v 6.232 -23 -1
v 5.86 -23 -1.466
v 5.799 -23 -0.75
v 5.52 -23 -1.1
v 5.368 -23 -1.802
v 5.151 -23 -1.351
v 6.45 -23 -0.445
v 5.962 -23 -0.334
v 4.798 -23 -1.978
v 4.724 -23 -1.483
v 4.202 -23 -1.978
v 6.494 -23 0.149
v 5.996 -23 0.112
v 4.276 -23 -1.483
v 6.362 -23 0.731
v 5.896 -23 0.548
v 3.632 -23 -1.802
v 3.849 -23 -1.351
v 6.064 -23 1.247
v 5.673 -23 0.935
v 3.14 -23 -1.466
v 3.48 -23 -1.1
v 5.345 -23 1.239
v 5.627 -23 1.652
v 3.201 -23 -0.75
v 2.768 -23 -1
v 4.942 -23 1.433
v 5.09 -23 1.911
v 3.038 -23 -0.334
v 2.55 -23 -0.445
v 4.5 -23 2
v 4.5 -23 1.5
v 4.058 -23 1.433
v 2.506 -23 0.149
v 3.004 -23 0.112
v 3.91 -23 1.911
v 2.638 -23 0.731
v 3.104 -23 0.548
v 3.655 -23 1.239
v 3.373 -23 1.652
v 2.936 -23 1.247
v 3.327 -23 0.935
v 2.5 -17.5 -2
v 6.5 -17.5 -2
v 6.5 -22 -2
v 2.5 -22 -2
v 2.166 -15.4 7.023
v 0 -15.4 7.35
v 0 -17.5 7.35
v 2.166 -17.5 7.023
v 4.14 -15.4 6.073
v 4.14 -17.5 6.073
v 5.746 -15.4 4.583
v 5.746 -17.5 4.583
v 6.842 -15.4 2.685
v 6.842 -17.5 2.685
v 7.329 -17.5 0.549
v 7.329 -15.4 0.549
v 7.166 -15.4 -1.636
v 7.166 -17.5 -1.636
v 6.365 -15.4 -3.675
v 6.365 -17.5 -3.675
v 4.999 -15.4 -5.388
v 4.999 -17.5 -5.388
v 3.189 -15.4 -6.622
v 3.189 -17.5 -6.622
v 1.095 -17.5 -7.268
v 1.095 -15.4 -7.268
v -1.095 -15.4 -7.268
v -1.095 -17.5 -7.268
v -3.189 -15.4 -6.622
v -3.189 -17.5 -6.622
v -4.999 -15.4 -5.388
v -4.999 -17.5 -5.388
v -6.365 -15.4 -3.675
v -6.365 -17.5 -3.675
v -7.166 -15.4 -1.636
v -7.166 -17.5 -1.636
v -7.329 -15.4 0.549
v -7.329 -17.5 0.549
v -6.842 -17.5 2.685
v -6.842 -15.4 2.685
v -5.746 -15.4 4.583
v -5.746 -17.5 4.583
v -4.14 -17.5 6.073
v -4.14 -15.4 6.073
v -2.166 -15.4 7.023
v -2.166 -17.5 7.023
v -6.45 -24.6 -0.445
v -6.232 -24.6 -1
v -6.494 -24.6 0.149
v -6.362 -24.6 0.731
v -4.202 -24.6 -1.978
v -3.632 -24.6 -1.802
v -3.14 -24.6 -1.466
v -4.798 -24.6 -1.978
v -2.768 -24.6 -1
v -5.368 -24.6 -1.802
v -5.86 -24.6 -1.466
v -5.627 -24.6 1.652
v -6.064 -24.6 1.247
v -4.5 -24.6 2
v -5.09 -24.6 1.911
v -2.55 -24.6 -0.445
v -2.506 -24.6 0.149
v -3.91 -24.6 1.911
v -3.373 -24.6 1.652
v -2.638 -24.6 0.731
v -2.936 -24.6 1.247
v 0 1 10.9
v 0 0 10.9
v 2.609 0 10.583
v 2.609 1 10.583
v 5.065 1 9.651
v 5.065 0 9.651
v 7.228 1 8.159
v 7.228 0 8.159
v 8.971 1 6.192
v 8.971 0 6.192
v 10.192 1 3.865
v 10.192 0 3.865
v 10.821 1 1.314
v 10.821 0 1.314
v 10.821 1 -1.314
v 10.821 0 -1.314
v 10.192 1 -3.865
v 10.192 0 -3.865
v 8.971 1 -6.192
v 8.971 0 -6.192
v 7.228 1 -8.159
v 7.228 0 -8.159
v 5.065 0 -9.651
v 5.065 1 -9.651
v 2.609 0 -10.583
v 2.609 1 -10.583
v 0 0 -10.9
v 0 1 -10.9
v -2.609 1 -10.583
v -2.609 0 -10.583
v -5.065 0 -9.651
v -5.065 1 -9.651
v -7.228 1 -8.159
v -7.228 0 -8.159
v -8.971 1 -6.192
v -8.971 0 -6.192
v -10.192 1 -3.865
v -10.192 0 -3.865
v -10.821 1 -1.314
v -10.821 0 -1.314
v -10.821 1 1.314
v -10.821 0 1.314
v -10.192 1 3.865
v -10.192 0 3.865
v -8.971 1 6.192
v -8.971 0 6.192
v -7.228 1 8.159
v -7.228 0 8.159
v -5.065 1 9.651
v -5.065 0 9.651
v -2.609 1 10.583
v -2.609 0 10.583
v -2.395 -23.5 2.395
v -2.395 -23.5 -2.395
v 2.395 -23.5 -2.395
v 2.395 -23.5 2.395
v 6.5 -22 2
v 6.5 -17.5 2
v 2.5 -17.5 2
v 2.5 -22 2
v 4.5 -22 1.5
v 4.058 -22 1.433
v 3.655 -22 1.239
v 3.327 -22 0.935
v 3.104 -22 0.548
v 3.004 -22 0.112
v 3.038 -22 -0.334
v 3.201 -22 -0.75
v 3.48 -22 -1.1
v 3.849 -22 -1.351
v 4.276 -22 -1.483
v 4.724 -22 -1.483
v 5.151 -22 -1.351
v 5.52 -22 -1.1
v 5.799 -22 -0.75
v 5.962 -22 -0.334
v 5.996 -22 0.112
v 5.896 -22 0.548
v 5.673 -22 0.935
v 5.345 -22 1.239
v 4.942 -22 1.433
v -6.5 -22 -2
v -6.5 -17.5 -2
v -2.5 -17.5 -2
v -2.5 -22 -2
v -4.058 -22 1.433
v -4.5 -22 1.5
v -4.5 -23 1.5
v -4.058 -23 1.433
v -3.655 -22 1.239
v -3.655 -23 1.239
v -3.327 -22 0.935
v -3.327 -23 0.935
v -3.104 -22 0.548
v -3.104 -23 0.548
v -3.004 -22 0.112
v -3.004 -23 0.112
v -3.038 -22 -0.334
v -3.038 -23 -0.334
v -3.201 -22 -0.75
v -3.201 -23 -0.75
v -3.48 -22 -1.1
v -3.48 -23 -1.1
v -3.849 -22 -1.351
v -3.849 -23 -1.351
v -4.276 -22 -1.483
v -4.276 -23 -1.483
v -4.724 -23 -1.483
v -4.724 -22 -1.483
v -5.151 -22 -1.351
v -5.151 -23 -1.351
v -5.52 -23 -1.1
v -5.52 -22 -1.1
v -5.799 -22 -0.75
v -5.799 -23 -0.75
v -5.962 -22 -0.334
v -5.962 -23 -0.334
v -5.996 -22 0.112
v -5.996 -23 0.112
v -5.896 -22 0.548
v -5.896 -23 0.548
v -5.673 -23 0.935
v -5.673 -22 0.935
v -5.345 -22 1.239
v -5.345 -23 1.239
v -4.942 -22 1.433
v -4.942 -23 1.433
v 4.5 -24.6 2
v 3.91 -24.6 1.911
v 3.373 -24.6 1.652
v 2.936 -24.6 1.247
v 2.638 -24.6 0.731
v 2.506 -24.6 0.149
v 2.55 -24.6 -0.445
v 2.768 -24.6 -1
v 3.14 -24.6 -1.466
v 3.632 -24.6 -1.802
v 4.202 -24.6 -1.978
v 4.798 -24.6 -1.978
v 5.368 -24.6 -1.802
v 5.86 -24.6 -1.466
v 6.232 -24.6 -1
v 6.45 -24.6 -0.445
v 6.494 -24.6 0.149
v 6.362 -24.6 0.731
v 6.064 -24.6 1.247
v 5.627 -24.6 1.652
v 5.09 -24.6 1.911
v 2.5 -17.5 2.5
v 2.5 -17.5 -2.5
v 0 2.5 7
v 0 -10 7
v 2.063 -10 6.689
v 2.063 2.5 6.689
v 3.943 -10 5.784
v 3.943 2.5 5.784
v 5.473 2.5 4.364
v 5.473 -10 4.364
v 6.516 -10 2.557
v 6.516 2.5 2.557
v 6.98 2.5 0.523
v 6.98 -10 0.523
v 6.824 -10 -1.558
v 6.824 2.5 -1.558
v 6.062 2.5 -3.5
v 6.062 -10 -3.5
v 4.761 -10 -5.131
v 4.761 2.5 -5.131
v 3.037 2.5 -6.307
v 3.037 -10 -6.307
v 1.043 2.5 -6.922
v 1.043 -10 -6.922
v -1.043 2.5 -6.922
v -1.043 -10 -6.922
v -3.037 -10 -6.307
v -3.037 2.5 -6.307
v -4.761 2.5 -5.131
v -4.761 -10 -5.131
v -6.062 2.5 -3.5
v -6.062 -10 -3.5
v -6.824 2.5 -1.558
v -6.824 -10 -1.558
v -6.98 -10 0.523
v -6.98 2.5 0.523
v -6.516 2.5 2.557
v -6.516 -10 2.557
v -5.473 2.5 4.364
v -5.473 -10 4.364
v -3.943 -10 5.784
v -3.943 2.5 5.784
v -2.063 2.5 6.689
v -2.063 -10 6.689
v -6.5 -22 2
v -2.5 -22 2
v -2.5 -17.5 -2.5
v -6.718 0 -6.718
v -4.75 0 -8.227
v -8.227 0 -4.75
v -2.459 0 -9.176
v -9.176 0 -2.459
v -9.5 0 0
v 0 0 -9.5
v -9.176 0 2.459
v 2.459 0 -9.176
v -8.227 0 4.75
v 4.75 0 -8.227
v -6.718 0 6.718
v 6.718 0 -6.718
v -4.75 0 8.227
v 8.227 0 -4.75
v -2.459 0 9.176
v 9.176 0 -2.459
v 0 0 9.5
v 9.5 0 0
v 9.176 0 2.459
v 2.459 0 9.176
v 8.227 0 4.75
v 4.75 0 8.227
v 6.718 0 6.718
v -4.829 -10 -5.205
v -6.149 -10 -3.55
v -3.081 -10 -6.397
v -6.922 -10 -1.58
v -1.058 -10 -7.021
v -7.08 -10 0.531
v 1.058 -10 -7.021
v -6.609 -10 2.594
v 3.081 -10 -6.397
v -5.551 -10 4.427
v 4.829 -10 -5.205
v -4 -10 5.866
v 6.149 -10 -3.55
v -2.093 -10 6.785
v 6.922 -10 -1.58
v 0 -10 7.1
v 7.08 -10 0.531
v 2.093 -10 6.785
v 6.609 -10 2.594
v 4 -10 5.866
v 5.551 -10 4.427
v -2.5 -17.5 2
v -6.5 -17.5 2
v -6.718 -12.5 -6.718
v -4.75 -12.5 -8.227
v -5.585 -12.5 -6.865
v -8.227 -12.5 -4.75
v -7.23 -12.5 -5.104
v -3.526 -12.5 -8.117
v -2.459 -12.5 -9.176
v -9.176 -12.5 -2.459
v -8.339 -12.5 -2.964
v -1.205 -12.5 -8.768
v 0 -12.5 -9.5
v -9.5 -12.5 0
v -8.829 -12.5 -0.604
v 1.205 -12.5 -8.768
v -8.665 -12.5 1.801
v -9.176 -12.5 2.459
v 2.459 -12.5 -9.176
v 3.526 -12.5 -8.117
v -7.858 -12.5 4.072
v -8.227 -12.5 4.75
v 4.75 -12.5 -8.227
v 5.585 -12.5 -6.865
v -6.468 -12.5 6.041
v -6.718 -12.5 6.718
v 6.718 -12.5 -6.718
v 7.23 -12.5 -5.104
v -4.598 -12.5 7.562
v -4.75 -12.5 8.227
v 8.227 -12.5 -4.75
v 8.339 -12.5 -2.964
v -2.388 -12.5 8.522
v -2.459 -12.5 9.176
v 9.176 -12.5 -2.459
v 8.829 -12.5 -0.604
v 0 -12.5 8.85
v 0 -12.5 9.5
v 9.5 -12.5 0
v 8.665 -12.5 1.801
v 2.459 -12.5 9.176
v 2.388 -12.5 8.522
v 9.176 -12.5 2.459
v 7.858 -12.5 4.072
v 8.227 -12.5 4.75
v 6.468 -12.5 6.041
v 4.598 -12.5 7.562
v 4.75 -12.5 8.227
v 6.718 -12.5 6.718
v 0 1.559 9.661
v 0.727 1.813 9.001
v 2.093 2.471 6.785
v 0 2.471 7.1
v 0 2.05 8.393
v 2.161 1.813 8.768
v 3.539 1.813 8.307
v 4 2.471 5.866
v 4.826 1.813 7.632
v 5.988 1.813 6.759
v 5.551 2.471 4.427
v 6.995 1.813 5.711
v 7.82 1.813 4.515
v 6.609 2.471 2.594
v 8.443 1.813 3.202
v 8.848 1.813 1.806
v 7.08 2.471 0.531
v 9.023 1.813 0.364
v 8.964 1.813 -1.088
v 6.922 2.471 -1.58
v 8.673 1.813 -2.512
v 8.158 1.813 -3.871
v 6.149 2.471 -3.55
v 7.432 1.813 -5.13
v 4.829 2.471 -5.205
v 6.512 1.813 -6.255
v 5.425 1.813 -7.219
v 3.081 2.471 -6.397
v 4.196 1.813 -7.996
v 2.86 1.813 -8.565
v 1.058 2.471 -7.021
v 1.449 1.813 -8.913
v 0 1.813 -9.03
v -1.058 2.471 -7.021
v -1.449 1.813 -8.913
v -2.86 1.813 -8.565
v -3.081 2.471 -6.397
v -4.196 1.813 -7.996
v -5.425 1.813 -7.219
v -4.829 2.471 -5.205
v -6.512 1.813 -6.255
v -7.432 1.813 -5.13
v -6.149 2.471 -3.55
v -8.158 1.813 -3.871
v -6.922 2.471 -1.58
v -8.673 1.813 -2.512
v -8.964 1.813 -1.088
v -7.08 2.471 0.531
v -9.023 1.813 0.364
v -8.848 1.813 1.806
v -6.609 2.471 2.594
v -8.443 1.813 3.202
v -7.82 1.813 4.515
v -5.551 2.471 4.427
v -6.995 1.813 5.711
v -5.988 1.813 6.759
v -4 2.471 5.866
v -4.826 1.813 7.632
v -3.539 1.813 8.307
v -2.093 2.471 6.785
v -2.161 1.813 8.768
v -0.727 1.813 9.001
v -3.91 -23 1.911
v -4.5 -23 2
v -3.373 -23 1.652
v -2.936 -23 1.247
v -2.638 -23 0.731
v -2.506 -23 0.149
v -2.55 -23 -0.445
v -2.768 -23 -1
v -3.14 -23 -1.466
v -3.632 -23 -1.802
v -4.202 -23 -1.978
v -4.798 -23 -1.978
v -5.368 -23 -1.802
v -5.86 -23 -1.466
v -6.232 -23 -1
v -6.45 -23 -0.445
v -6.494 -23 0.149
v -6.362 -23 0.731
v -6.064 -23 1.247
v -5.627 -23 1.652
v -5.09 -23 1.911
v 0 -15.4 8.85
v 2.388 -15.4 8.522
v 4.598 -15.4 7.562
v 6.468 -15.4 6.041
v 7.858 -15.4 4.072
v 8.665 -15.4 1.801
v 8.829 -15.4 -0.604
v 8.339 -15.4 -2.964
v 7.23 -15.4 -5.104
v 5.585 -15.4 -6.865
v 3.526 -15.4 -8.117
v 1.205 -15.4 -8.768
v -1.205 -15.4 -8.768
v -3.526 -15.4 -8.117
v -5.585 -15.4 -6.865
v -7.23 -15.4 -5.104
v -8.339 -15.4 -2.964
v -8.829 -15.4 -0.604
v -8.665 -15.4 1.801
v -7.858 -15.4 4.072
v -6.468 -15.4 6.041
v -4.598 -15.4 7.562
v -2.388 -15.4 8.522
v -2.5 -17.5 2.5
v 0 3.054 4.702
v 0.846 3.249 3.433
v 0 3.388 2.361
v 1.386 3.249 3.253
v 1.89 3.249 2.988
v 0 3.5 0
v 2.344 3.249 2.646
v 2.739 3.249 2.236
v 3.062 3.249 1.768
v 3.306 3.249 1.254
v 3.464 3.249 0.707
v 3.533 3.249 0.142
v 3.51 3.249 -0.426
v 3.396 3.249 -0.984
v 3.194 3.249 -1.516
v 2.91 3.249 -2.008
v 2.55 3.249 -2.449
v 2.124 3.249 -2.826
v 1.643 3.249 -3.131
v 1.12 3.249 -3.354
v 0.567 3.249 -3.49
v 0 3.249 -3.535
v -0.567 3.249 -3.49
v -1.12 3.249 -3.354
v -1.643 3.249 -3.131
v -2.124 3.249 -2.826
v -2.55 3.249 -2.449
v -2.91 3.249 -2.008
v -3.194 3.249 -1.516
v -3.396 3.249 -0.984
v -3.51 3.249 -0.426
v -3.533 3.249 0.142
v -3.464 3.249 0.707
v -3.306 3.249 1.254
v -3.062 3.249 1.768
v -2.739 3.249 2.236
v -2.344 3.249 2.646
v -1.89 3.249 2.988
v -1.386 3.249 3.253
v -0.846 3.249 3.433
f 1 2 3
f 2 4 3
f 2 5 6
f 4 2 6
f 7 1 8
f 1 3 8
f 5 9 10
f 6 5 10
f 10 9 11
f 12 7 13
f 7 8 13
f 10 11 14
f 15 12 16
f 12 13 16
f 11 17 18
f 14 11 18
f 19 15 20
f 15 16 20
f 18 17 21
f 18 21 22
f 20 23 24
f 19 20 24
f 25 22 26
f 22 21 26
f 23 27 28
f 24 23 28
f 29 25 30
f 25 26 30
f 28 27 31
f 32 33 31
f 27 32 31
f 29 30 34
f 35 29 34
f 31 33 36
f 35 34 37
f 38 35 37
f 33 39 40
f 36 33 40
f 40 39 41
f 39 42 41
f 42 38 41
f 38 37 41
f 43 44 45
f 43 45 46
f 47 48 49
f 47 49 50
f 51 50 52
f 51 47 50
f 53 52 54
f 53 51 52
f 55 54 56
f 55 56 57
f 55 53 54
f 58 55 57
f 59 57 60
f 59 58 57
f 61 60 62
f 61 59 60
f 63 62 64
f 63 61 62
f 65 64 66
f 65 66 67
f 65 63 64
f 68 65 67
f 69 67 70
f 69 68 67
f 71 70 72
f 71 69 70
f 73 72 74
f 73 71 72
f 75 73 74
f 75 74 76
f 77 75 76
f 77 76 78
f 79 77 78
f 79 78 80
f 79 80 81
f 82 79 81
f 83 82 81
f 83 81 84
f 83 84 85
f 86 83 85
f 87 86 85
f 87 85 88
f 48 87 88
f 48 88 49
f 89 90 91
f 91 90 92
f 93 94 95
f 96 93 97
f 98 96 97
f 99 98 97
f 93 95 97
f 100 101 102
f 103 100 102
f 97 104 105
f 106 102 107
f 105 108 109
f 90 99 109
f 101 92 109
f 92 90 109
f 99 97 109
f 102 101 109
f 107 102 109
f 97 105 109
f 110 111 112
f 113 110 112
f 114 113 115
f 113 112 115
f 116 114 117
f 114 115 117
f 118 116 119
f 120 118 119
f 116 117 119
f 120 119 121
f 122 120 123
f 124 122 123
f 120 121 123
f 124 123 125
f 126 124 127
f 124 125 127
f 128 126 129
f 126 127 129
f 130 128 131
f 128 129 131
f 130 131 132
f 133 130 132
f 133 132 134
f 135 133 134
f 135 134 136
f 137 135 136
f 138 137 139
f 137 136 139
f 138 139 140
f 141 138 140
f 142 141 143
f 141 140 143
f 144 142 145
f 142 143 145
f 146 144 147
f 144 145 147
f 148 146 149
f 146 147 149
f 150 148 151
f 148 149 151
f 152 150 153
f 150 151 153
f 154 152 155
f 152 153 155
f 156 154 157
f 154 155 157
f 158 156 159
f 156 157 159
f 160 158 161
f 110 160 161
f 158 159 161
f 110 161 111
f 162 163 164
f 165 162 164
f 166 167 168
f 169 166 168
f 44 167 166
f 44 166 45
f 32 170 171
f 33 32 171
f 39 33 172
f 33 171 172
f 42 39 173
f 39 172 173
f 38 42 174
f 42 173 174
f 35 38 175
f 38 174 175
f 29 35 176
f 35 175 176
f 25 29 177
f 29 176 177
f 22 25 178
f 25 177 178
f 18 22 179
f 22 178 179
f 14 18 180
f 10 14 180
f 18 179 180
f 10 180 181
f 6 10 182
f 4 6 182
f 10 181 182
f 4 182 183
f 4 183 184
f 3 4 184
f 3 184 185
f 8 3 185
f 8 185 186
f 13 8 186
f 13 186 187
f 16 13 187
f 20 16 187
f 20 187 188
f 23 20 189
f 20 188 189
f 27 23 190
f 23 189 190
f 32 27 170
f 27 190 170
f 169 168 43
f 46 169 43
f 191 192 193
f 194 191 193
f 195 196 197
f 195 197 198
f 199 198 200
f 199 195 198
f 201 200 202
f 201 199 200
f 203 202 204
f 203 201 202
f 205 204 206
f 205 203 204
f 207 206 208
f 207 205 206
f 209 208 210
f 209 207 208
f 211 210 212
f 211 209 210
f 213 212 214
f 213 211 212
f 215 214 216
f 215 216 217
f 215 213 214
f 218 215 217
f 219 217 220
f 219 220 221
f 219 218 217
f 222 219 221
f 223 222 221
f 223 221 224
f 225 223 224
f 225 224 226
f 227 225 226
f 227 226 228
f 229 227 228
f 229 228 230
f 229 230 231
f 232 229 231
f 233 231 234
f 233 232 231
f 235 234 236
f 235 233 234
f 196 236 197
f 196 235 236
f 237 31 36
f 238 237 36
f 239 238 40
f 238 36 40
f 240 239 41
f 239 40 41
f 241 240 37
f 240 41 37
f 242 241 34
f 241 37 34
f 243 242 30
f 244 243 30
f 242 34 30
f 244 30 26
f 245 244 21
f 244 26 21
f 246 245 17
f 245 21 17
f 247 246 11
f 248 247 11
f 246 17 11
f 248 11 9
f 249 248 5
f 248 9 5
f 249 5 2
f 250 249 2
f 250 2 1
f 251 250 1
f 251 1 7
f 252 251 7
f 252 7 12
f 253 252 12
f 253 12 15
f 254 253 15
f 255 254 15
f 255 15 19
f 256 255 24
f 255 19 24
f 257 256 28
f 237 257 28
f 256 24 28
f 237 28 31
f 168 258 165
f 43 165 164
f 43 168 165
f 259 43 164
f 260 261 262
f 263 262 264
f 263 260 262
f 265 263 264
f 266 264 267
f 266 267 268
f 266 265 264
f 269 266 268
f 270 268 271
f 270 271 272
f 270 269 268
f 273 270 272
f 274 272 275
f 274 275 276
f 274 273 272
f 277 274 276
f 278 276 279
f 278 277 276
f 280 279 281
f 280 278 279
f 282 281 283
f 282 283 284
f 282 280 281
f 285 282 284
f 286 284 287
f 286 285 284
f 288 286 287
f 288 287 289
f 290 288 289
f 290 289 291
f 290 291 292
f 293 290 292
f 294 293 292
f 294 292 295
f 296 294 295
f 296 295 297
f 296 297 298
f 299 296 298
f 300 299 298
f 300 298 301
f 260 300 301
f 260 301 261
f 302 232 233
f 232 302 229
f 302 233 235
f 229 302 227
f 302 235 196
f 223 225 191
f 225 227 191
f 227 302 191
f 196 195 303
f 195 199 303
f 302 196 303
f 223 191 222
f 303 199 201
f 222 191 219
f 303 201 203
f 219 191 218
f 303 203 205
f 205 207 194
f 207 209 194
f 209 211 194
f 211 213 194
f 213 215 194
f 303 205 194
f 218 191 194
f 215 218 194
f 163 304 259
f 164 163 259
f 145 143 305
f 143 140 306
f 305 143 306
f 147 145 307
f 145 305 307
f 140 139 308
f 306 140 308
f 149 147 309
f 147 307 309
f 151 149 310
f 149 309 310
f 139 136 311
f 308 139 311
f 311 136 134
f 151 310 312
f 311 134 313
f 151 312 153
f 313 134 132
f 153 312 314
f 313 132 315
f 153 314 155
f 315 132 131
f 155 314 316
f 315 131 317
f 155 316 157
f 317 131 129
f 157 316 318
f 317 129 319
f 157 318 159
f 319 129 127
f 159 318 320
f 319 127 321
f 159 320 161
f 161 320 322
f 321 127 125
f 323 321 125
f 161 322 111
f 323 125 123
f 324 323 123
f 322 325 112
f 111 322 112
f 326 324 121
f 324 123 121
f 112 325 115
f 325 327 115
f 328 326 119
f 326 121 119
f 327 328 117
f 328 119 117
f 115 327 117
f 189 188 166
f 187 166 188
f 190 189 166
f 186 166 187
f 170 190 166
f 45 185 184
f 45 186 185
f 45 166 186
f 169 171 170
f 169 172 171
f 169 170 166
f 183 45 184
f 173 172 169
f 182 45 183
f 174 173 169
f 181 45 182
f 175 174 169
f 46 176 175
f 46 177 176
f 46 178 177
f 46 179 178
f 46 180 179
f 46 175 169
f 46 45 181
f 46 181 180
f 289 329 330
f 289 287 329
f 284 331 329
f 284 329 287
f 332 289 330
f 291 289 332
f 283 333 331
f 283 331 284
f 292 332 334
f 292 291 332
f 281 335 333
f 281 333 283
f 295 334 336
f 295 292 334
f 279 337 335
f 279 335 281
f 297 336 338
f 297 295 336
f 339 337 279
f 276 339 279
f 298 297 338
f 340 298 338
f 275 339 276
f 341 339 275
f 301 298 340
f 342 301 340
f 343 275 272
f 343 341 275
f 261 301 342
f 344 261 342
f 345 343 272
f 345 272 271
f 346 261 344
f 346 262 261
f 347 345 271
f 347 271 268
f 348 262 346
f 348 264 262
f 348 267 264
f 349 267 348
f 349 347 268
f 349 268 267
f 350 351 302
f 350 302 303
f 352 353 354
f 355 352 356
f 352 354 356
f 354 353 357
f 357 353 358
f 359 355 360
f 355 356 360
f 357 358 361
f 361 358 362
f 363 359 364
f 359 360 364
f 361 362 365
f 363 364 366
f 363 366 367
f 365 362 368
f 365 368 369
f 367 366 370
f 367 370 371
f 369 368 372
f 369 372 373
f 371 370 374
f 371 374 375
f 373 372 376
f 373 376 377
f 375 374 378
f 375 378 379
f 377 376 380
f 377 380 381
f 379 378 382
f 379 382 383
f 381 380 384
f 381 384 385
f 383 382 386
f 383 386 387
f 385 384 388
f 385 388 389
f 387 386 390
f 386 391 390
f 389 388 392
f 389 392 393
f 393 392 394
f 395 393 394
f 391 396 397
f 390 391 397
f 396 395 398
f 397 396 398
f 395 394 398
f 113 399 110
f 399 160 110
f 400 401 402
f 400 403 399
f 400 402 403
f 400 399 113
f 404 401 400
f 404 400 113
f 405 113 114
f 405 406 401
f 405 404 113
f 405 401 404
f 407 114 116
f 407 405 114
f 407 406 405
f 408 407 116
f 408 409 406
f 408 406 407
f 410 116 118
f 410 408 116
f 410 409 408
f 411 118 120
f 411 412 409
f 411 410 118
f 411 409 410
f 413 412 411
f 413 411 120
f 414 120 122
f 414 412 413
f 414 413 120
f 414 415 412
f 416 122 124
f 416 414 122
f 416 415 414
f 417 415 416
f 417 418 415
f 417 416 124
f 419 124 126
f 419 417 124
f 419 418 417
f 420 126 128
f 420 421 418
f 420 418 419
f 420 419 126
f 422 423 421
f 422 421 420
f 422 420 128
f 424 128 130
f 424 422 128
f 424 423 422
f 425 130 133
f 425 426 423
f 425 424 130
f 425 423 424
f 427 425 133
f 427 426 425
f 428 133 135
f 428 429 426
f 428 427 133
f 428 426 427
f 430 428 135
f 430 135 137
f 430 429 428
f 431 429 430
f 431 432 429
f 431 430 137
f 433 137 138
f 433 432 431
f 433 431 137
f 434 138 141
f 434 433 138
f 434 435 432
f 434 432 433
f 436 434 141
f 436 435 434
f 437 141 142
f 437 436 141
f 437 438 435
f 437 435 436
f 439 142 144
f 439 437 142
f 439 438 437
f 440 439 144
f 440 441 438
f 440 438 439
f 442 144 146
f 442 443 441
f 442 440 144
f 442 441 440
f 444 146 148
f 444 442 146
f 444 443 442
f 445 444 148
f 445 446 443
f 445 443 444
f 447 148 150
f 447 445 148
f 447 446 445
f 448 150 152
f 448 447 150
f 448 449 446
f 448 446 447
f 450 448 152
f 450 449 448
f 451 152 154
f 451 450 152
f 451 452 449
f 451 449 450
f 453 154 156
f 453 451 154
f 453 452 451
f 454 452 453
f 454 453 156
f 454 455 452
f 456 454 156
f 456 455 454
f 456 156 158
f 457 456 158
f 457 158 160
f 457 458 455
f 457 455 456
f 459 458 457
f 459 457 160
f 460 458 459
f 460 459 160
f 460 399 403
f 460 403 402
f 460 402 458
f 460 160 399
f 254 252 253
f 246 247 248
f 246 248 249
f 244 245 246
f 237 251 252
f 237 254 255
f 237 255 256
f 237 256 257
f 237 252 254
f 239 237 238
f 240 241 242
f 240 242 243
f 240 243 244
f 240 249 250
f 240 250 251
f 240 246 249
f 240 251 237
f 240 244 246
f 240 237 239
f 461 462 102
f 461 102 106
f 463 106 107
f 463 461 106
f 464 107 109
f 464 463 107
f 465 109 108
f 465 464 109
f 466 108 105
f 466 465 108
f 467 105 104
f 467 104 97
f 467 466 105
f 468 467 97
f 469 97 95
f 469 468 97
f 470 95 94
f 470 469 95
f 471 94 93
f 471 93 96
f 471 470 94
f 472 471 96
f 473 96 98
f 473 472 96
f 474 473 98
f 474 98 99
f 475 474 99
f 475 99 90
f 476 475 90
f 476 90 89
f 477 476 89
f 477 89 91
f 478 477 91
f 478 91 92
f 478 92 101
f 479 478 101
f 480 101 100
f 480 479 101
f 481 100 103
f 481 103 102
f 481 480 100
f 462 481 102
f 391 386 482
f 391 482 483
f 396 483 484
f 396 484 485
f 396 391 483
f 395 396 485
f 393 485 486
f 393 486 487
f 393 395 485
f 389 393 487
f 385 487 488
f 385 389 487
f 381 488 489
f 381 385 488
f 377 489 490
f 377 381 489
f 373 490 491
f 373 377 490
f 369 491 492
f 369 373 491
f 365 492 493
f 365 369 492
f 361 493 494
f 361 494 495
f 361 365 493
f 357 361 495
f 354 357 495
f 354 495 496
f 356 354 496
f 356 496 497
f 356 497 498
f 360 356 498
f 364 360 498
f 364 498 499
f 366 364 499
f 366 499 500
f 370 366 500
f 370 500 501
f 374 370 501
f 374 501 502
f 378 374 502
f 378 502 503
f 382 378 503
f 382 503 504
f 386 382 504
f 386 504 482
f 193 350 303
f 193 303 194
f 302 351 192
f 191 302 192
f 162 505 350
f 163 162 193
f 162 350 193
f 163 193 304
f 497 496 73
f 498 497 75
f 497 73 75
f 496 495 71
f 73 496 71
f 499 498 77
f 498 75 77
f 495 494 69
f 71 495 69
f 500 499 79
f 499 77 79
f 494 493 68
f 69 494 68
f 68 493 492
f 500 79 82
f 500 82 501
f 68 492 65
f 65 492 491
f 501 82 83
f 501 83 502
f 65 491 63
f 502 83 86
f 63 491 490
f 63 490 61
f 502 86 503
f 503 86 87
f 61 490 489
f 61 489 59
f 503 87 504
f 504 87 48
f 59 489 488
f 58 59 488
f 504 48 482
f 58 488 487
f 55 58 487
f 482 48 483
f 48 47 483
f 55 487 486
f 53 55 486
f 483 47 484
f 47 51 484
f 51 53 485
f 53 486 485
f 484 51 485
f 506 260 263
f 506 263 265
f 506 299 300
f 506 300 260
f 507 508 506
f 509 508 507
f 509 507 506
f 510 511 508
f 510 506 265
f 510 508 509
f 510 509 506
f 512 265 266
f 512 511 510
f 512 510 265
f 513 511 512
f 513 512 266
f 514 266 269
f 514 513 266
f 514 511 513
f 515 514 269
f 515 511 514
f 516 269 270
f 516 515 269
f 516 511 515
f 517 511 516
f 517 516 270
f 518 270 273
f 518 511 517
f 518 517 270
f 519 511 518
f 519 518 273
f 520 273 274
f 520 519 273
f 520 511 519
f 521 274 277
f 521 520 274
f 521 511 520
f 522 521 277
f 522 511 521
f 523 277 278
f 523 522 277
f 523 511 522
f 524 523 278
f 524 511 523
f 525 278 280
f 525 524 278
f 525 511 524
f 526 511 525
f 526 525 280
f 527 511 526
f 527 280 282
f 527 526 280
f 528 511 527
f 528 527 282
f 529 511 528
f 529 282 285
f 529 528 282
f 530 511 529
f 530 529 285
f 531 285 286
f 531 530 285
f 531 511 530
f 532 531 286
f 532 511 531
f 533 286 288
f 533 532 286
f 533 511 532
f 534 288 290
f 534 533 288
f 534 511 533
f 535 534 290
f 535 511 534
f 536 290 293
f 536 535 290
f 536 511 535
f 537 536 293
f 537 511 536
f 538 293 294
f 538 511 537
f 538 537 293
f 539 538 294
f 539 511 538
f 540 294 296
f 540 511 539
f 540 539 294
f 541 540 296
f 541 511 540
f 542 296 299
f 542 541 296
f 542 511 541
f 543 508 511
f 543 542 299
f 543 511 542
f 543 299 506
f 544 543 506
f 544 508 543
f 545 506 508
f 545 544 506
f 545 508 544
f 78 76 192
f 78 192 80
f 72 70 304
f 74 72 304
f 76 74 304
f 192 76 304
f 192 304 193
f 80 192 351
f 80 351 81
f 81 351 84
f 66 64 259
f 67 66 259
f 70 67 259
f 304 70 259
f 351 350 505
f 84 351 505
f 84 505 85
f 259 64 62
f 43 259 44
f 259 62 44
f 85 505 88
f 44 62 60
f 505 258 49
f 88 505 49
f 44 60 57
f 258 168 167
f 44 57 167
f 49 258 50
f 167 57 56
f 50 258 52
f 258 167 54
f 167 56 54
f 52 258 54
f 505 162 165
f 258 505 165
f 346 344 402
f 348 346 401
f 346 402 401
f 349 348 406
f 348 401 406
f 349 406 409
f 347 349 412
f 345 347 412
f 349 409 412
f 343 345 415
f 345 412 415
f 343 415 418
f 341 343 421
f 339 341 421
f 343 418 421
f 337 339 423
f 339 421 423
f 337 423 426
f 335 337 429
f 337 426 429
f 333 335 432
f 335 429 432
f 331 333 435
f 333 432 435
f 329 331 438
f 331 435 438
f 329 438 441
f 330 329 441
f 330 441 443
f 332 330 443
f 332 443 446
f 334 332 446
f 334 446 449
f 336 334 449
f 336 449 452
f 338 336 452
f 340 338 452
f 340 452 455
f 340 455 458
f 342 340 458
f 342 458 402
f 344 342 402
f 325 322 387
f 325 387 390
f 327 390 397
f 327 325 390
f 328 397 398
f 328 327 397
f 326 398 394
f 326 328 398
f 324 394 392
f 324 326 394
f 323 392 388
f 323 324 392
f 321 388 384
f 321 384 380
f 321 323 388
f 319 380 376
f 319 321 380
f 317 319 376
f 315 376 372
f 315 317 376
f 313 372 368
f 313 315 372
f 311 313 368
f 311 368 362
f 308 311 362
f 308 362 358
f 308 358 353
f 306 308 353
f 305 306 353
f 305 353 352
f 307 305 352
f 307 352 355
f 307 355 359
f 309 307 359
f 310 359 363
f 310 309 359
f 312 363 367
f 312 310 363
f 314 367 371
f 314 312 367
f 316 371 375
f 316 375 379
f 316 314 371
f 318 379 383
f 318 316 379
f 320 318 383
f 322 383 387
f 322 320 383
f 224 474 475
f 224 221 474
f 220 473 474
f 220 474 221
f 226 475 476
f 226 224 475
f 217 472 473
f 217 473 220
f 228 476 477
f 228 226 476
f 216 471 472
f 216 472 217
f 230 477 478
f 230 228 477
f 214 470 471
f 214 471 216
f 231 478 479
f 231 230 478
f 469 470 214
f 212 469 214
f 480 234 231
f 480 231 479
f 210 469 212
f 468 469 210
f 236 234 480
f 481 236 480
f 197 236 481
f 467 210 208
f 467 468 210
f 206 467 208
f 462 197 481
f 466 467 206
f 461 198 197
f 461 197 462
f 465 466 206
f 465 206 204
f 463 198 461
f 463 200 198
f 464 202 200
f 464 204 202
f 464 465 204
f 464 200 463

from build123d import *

# Parameters (mm, degrees)
SKETCH_1_R          = 10.9
EXTRUDE_1_DEPTH     = 1
DOME_1_FACE_RADIUS  = 10.9
DOME_1_HEIGHT       = 2.5
SKETCH_2_R          = 9.5
EXTRUDE_2_DEPTH     = 12.5
SKETCH_3_R          = 8.85
EXTRUDE_3_DEPTH     = 15.4
SKETCH_4_R          = 7.35
EXTRUDE_4_DEPTH     = 17.5
EXTRUDE_START       = -17.5
SKETCH_6_W          = 5
SKETCH_6_H          = 5
EXTRUDE_5_DEPTH     = 6
EXTRUDE_5_DRAFT     = -1
SKETCH_7_W          = 4
SKETCH_7_H          = 4
EXTRUDE_6_DEPTH     = 4.5
EXTRUDE_START_2     = -22
SKETCH_8_R          = 1.5
EXTRUDE_7_DEPTH     = 1
EXTRUDE_START_3     = -23
SKETCH_9_R          = 2
EXTRUDE_11_DEPTH    = 1.6
CUT_EXTRUDE_START   = 5
SKETCH_5_R          = 7.1
SKETCH_5_R_2        = 7
CUT_EXTRUDE_1_DEPTH = 15


with BuildPart() as part:
    # Эскиз1 → Бобышка-Вытянуть1 (new body)
    with BuildSketch(Plane(origin=(0, 0, 0), x_dir=(1, 0, 0), z_dir=(0, 1, 0))):
        with Locations(Location((0, 0, 0), (0, 0, 270))):
            Circle(SKETCH_1_R)
    extrude(amount=EXTRUDE_1_DEPTH)

    # Купол1: a dome of height H over a round flat face of radius A is a cap of a sphere of radius (A * A + H * H) / (2 * H)
    dome_1_r = (DOME_1_FACE_RADIUS * DOME_1_FACE_RADIUS + DOME_1_HEIGHT * DOME_1_HEIGHT) / (2 * DOME_1_HEIGHT)
    dome_1_base = Plane((0, 1, 0), z_dir=(0, 1, 0))
    with Locations(dome_1_base.offset(DOME_1_HEIGHT - dome_1_r)):
        dome_1_ball = Sphere(dome_1_r, mode=Mode.PRIVATE)
    add(split(dome_1_ball, bisect_by=dome_1_base, keep=Keep.TOP, mode=Mode.PRIVATE))

    # Эскиз2 → Бобышка-Вытянуть2 (add)
    with BuildSketch(Plane(origin=(0, 0, 0), x_dir=(1, 0, 0), z_dir=(0, 1, 0))):
        with Locations(Location((0, 0, 0), (0, 0, 270))):
            Circle(SKETCH_2_R)
    extrude(amount=-EXTRUDE_2_DEPTH)

    # Эскиз3 → Бобышка-Вытянуть3 (add)
    with BuildSketch(Plane(origin=(0, 0, 0), x_dir=(1, 0, 0), z_dir=(0, 1, 0))):
        with Locations(Location((0, 0, 0), (0, 0, 270))):
            Circle(SKETCH_3_R)
    extrude(amount=-EXTRUDE_3_DEPTH)

    # Эскиз4 → Бобышка-Вытянуть4 (add)
    with BuildSketch(Plane(origin=(0, 0, 0), x_dir=(1, 0, 0), z_dir=(0, 1, 0))):
        with Locations(Location((0, 0, 0), (0, 0, 270))):
            Circle(SKETCH_4_R)
    extrude(amount=-EXTRUDE_4_DEPTH)


with BuildPart() as extrude_5_tool:
    # Эскиз6 → Бобышка-Вытянуть5 (with draft: the straight prism first)
    with BuildSketch(Plane(origin=(0, 0, 0), x_dir=(1, 0, 0), z_dir=(0, 1, 0)).offset(EXTRUDE_START)):
        Rectangle(SKETCH_6_W, SKETCH_6_H)
    extrude(amount=-EXTRUDE_5_DEPTH)
    # Бобышка-Вытянуть5: the draft: its side faces are tilted about the plane it starts from
    extrude_5_sides = [extrude_5_tool.faces().sort_by_distance(p)[0] for p in [
        (0, -20.5, 2.5),
        (2.5, -20.5, 0),
        (0, -20.5, -2.5),
        (-2.5, -20.5, 0),
    ]]
    draft(extrude_5_sides, Plane(origin=(0, 0, 0), x_dir=(1, 0, 0), z_dir=(0, 1, 0)).offset(EXTRUDE_START), EXTRUDE_5_DRAFT)


with BuildPart() as part_1:
    add(part.part)

    # Бобышка-Вытянуть5: add extrude_5_tool
    add(extrude_5_tool.part)

    # Эскиз7 → Бобышка-Вытянуть6 (add)
    with BuildSketch(Plane(origin=(0, 0, 0), x_dir=(1, 0, 0), z_dir=(0, 1, 0)).offset(EXTRUDE_START)):
        with Locations((-4.5, 0)):
            Rectangle(SKETCH_7_W, SKETCH_7_H)
    extrude_6 = extrude(amount=-EXTRUDE_6_DEPTH)

    # Зеркальное отражение1: Бобышка-Вытянуть6 across plane
    add(extrude_6.mirror(Plane(origin=(0, 0, 0), x_dir=(0, 0, 1), z_dir=(1, 0, 0))))

    # Эскиз8 → Бобышка-Вытянуть7 (add)
    with BuildSketch(Plane(origin=(0, 0, 0), x_dir=(1, 0, 0), z_dir=(0, 1, 0)).offset(EXTRUDE_START_2)):
        with Locations(Location((-4.5, 0, 0), (0, 0, 270))):
            Circle(SKETCH_8_R)
    extrude_7 = extrude(amount=-EXTRUDE_7_DEPTH)

    # Эскиз9 → Бобышка-Вытянуть11 (add)
    with BuildSketch(Plane(origin=(0, 0, 0), x_dir=(1, 0, 0), z_dir=(0, 1, 0)).offset(EXTRUDE_START_3)):
        with Locations(Location((-4.5, 0, 0), (0, 0, 270))):
            Circle(SKETCH_9_R)
    extrude_11 = extrude(amount=-EXTRUDE_11_DEPTH)

    # Зеркальное отражение3: Бобышка-Вытянуть7, Бобышка-Вытянуть11 across plane
    add(extrude_7.mirror(Plane(origin=(0, 0, 0), x_dir=(0, 0, 1), z_dir=(1, 0, 0))))
    add(extrude_11.mirror(Plane(origin=(0, 0, 0), x_dir=(0, 0, 1), z_dir=(1, 0, 0))))

    # Эскиз5 → Вырез-Вытянуть1 (cut)
    with BuildSketch(Plane(origin=(0, 0, 0), x_dir=(1, 0, 0), z_dir=(0, 1, 0)).offset(CUT_EXTRUDE_START)):
        with Locations(Location((0, 0, 0), (0, 0, 270))):
            Circle(SKETCH_5_R)
        with Locations(Location((0, 0, 0), (0, 0, 270))):
            Circle(SKETCH_5_R_2, mode=Mode.SUBTRACT)
    extrude(amount=-CUT_EXTRUDE_1_DEPTH, mode=Mode.SUBTRACT)


solid = part_1.part
